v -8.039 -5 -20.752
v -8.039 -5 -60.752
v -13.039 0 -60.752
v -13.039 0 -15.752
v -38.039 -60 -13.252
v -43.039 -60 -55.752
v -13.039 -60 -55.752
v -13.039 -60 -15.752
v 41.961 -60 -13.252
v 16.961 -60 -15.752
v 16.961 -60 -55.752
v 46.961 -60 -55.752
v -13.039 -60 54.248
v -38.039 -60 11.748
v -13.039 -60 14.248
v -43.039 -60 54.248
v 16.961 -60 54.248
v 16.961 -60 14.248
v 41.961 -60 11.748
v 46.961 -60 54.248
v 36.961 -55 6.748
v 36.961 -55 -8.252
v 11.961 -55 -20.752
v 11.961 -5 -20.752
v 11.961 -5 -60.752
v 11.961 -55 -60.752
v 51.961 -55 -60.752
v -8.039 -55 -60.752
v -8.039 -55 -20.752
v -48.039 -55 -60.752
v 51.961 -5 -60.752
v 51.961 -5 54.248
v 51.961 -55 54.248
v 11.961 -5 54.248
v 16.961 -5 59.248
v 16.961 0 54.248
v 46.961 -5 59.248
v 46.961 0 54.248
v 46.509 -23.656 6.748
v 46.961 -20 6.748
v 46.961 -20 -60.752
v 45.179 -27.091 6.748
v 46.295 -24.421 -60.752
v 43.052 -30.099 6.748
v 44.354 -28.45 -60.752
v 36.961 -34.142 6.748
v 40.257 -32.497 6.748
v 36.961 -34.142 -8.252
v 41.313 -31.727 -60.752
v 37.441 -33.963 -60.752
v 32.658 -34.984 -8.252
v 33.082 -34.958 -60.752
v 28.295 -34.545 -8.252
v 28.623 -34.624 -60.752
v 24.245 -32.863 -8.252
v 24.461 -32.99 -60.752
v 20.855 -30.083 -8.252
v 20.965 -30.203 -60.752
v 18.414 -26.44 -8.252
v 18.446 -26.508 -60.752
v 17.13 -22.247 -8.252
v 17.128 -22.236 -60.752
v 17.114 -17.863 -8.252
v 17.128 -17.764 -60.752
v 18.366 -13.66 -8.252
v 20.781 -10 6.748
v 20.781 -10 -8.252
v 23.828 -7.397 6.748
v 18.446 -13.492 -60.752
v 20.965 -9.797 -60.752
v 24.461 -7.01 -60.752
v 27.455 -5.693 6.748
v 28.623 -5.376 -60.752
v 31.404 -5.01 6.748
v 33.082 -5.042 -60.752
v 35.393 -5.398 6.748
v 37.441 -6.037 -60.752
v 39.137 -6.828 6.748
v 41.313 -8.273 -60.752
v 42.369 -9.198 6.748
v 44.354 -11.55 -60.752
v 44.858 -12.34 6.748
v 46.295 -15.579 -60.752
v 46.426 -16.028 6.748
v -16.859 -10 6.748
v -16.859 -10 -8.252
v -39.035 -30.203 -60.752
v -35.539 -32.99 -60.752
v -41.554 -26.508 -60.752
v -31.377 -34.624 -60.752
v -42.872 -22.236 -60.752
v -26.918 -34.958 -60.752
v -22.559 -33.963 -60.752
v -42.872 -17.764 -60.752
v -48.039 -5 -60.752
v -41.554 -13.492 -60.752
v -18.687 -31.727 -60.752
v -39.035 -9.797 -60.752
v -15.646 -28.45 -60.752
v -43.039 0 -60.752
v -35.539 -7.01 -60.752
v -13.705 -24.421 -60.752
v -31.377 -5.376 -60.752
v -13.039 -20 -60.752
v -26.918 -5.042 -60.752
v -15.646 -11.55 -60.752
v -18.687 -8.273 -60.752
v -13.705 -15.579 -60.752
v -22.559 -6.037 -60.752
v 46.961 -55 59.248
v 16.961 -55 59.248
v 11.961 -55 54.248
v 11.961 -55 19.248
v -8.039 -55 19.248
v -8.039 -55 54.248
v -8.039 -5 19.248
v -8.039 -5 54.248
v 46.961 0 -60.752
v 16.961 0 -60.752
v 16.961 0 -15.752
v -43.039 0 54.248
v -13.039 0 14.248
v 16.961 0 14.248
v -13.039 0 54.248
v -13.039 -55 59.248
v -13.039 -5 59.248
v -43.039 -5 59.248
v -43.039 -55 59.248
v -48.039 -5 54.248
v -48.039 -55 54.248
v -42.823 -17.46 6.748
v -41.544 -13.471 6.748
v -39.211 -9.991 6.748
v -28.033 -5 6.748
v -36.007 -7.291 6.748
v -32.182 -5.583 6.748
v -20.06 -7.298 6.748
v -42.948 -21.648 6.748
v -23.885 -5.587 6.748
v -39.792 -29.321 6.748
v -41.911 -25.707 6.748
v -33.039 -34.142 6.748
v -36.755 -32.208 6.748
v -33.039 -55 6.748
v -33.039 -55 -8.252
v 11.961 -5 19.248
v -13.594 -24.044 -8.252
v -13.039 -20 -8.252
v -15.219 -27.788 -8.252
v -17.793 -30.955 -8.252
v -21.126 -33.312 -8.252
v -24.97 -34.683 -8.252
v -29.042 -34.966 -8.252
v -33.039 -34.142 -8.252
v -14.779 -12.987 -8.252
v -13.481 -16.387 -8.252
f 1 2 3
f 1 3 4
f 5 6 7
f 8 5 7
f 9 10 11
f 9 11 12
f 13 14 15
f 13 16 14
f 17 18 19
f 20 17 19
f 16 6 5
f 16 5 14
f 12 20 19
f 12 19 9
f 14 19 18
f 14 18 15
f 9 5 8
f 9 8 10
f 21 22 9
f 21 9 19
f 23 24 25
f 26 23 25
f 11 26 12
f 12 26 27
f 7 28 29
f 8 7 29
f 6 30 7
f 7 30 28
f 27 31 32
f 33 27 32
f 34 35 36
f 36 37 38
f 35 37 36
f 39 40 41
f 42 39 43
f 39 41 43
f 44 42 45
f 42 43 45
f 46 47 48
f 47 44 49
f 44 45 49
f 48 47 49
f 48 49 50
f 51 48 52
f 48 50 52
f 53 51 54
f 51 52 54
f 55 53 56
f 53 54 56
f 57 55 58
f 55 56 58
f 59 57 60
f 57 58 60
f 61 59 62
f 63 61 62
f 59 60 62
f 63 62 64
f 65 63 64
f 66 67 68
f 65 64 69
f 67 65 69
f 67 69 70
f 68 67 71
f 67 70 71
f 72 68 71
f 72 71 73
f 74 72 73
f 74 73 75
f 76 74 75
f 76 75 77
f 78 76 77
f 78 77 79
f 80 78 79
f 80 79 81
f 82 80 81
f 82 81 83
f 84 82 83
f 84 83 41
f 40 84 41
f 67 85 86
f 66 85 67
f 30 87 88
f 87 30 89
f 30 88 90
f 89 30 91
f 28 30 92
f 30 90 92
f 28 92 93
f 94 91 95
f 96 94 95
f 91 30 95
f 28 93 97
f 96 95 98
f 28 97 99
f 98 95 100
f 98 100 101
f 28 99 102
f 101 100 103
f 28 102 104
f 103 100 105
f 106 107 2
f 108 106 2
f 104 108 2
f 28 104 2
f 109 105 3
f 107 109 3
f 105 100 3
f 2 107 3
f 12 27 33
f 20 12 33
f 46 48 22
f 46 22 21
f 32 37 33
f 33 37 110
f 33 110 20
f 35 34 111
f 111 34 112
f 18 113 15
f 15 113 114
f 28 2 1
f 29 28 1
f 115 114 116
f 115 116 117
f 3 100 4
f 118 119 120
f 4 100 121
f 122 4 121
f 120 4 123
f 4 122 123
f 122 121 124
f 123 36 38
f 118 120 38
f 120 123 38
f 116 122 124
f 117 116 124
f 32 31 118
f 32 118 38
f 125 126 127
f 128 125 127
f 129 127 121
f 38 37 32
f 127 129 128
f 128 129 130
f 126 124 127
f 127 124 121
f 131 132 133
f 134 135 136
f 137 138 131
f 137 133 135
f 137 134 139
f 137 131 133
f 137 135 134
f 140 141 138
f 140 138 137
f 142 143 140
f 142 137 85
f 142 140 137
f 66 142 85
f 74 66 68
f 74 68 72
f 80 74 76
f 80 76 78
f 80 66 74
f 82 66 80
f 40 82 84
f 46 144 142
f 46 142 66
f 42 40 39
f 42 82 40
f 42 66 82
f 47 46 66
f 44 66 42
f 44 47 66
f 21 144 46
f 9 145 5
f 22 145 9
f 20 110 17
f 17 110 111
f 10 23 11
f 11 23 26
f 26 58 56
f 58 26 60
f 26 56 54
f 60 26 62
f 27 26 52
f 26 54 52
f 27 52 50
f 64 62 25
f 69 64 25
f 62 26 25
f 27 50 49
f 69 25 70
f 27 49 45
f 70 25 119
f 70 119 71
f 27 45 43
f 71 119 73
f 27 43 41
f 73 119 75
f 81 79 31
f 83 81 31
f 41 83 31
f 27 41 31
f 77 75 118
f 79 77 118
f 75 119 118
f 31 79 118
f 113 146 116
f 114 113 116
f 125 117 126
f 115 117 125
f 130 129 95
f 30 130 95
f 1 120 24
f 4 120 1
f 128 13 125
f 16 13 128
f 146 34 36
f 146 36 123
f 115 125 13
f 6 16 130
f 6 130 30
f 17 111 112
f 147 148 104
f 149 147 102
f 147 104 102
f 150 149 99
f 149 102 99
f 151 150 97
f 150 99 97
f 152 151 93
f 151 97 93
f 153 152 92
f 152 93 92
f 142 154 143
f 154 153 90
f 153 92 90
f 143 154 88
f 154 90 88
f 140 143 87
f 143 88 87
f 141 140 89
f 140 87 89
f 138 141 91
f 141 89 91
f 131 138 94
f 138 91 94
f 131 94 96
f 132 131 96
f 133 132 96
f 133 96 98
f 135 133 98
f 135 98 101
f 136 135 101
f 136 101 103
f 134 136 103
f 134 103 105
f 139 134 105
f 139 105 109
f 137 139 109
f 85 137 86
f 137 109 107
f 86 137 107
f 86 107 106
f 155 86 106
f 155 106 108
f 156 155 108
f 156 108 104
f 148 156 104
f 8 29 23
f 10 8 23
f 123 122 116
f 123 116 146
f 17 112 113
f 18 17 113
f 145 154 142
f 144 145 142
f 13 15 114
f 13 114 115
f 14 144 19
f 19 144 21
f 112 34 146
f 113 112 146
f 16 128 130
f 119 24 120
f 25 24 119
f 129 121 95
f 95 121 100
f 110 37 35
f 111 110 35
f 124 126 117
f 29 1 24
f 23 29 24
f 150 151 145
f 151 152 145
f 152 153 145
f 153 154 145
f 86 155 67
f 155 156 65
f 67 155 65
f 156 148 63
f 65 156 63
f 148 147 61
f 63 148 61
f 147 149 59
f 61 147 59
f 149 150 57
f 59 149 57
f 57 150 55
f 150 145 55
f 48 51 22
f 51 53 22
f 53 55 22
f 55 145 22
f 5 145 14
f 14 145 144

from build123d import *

# Parameters (mm, degrees)
F1_DEPTH = 60
F2_W     = 70
F2_H     = 15
F3_DEPTH = 50
F4_R     = 15
F5_R     = 15
F6_DEPTH = 67.5
F7_SIZE  = 5
F8_SIZE  = 4.99999
F9_SIZE  = 5


# Not quite as in the source:
# - a fillet or chamfer is up to 0.001 mm smaller than in the source, because OpenCascade refuses the exact size


with BuildPart() as f1:
    # F0 (on Front) → F1 (new body)
    with BuildSketch(Plane.XZ):
        Polygon((-8.0390890029, 59.2476050396), (-48.0390890029, 59.2476050396), (-48.0390890029, -60.7523949604), (-8.0390890029, -60.7523949604), (-8.0390890029, -20.7523949604), (11.9609109971, -20.7523949604), (11.9609109971, -60.7523949604), (51.9609109971, -60.7523949604), (51.9609109971, 59.2476050396), (11.9609109971, 59.2476050396), (11.9609109971, 19.2476050396), (-8.0390890029, 19.2476050396), align=None)
    extrude(amount=F1_DEPTH)

    # F2 (on face) → F3 (cut)
    with BuildSketch(Plane.XZ.offset(60)):
        with Locations((1.9609109971, -0.7523949604)):
            Rectangle(F2_W, F2_H)
    extrude(amount=-F3_DEPTH, mode=Mode.SUBTRACT)

    # F4 (on face) + F5 (on face) → F6 (cut)
    with BuildSketch(Plane(origin=(0, 0, -60.7523949604), x_dir=(1, 0, 0), z_dir=(0, 0, -1))):
        with Locations((-28.0390890029, 20)):
            Circle(F4_R)
    with BuildSketch(Plane(origin=(0, 0, -60.7523949604), x_dir=(1, 0, 0), z_dir=(0, 0, -1))):
        with Locations((31.9609109971, 20)):
            Circle(F5_R)
    extrude(amount=-F6_DEPTH, mode=Mode.SUBTRACT)

    # F7
    f7_edges = [f1.edges().sort_by_distance(p)[0] for p in [
        (-48.039089, -30, 59.247605),
        (-8.039089, -30, 59.247605),
        (11.960911, -30, 59.247605),
        (51.960911, -30, 59.247605),
        (31.960911, -60, 59.247605),
        (-28.039089, -60, 59.247605),
        (31.960911, 0, 59.247605),
        (-28.039089, 0, 59.247605),
        (1.960911, -60, 6.747605),
        (-33.039089, -60, -0.752395),
        (1.960911, -60, -8.252395),
        (36.960911, -60, -0.752395),
        (51.960911, -60, -0.752395),
        (51.960911, 0, -0.752395),
        (11.960911, -60, 39.247605),
        (1.960911, -60, 19.247605),
        (-8.039089, -60, 39.247605),
        (31.960911, -60, -60.752395),
        (11.960911, -60, -40.752395),
        (-48.039089, -60, -0.752395),
        (1.960911, -60, -20.752395),
        (-28.039089, -60, -60.752395),
        (-8.039089, -60, -40.752395),
        (-48.039089, 0, -0.752395),
        (11.960911, 0, -40.752395),
        (-8.039089, 0, -40.752395),
        (11.960911, 0, 39.247605),
        (-8.039089, 0, 39.247605),
    ]]
    chamfer(f7_edges, length=F7_SIZE)

    # F8 (size 5 in the source; OpenCascade refuses exactly that, so slightly less here)
    f8_edges = [f1.edges().sort_by_distance(p)[0] for p in [
        (1.960911, 0, -20.752395),
    ]]
    chamfer(f8_edges, length=F8_SIZE)

    # F9
    f9_edges = [f1.edges().sort_by_distance(p)[0] for p in [
        (1.960911, 0, 19.247605),
    ]]
    chamfer(f9_edges, length=F9_SIZE)


solid = f1.part
